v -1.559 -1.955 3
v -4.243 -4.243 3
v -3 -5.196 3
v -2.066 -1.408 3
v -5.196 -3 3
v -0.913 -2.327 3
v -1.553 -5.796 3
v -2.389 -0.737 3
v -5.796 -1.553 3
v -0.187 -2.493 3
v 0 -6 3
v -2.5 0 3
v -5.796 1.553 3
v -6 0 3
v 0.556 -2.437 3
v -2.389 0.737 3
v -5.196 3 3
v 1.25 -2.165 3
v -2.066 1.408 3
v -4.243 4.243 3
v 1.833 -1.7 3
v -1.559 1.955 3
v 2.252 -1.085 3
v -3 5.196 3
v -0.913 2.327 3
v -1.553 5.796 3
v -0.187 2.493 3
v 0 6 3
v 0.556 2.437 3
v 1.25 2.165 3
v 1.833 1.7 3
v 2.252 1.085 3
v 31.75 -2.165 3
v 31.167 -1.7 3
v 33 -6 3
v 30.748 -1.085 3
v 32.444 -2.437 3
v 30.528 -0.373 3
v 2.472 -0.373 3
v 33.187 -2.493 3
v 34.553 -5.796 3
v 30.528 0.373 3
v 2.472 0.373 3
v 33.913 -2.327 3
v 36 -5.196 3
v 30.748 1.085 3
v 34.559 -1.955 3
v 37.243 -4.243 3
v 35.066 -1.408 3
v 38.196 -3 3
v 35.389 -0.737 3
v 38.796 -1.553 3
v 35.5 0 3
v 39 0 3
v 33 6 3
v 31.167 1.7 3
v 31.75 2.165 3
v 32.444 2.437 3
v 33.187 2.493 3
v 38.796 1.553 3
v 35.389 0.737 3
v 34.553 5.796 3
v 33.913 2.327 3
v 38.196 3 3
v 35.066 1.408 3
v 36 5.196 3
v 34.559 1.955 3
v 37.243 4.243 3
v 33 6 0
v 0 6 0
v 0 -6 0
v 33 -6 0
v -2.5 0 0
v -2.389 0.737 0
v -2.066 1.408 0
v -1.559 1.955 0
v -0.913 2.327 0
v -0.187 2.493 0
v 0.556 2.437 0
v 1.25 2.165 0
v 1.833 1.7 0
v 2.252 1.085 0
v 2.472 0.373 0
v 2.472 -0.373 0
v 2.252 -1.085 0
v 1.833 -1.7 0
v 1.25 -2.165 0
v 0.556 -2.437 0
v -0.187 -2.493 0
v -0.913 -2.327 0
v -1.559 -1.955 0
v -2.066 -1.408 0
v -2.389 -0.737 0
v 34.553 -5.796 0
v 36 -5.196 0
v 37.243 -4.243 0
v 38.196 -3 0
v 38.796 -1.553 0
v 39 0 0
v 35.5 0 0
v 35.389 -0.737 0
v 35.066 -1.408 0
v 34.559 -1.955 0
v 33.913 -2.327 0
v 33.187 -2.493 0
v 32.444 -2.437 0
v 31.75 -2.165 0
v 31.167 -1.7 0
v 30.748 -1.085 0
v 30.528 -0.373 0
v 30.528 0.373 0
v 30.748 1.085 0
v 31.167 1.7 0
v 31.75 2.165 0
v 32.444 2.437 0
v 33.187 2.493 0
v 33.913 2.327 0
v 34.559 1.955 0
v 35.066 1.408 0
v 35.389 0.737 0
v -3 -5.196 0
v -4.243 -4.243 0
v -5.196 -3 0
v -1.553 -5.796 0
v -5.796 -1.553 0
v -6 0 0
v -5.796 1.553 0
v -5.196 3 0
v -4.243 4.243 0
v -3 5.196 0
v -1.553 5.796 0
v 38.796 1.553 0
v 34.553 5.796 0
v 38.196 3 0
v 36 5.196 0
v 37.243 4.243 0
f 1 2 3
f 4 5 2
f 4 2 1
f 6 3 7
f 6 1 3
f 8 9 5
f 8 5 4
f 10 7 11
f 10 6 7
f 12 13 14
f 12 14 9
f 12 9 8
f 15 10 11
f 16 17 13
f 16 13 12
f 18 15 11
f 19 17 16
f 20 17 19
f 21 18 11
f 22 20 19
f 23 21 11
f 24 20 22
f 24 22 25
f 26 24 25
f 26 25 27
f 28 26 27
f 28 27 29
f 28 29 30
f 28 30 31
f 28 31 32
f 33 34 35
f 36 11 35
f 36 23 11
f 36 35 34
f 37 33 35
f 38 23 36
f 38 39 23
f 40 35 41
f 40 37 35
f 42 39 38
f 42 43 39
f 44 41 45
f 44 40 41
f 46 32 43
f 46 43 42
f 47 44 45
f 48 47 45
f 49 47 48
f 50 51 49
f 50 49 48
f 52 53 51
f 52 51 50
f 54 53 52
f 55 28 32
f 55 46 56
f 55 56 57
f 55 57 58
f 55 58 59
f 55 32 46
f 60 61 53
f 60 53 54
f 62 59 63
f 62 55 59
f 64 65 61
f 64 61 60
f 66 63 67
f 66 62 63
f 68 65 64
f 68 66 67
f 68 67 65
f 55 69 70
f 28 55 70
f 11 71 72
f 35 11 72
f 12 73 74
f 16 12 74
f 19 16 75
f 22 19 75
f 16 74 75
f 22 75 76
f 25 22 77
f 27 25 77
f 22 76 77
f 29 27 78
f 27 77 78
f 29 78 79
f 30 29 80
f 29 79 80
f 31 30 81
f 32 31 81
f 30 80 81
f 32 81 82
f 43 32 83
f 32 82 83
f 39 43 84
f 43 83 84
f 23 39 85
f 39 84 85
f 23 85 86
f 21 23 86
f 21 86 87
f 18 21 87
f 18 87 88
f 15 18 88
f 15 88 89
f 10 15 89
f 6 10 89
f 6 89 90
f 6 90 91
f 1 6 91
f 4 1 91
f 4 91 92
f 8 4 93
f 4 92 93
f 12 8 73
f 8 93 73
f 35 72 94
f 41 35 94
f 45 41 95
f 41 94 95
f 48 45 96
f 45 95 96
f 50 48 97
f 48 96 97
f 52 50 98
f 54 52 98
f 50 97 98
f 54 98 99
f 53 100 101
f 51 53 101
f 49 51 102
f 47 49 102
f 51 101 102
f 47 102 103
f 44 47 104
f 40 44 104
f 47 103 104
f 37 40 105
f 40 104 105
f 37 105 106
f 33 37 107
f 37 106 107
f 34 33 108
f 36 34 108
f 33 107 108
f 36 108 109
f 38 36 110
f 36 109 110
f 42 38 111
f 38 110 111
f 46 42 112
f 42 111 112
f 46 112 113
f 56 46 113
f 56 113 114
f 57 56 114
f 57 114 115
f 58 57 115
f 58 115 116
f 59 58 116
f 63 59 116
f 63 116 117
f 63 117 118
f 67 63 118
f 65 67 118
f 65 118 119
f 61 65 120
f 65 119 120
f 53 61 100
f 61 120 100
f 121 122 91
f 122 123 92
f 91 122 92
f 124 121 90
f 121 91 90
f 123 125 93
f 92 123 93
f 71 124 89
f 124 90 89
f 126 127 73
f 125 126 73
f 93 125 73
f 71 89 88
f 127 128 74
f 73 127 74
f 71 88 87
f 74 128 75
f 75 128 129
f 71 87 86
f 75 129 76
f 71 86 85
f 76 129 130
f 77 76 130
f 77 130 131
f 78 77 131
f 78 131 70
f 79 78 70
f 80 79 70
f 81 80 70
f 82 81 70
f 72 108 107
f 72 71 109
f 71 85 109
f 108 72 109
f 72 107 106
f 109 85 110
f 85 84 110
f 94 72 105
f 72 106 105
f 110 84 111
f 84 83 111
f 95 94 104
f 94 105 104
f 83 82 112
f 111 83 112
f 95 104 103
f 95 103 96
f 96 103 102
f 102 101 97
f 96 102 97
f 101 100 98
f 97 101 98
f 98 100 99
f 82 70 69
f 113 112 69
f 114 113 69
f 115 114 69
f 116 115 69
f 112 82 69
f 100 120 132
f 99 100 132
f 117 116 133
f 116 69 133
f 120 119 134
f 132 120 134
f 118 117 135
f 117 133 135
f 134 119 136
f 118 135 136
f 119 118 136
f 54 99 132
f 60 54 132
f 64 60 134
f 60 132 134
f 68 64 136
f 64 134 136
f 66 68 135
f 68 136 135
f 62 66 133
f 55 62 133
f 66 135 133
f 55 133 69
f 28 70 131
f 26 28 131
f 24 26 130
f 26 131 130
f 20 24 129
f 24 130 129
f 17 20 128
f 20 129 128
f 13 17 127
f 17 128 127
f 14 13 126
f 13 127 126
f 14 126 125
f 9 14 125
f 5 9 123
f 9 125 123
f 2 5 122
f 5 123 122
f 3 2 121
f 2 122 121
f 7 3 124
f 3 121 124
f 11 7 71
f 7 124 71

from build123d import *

# Parameters (mm, degrees)
EXTRUDE_1_DEPTH = 3


with BuildPart() as part:
    # 草图1 → 凸台-拉伸1 (new body)
    with BuildSketch(Plane.XY):
        with BuildLine():
            ThreePointArc((0, 6), (4.242640687, 4.242640687), (6, 0))
            Line((6, 0), (27, 0))
            ThreePointArc((27, 0), (28.757359313, 4.242640687), (33, 6))
            Line((33, 6), (0, 6))
        make_face()
        with BuildLine():
            Line((27, 0), (6, 0))
            ThreePointArc((6, 0), (4.242640687, -4.242640687), (0, -6))
            Line((0, -6), (33, -6))
            ThreePointArc((33, -6), (28.757359313, -4.242640687), (27, 0))
        make_face()
        with BuildLine():
            ThreePointArc((-2.5, 0), (0, 2.5), (2.5, 0))
            Line((2.5, 0), (6, 0))
            ThreePointArc((6, 0), (4.242640687, 4.242640687), (0, 6))
            ThreePointArc((0, 6), (-4.242640687, 4.242640687), (-6, 0))
            Line((-6, 0), (-2.5, 0))
        make_face()
        with BuildLine():
            Line((6, 0), (2.5, 0))
            ThreePointArc((2.5, 0), (0, -2.5), (-2.5, 0))
            Line((-2.5, 0), (-6, 0))
            ThreePointArc((-6, 0), (-4.242640687, -4.242640687), (0, -6))
            ThreePointArc((0, -6), (4.242640687, -4.242640687), (6, 0))
        make_face()
        with BuildLine():
            ThreePointArc((33, 6), (28.757359313, 4.242640687), (27, 0))
            Line((27, 0), (30.5, 0))
            ThreePointArc((30.5, 0), (33, 2.5), (35.5, 0))
            Line((35.5, 0), (39, 0))
            ThreePointArc((39, 0), (37.242640687, 4.242640687), (33, 6))
        make_face()
        with BuildLine():
            Line((30.5, 0), (27, 0))
            ThreePointArc((27, 0), (28.757359313, -4.242640687), (33, -6))
            ThreePointArc((33, -6), (37.242640687, -4.242640687), (39, 0))
            Line((39, 0), (35.5, 0))
            ThreePointArc((35.5, 0), (33, -2.5), (30.5, 0))
        make_face()
    extrude(amount=EXTRUDE_1_DEPTH)


solid = part.part
